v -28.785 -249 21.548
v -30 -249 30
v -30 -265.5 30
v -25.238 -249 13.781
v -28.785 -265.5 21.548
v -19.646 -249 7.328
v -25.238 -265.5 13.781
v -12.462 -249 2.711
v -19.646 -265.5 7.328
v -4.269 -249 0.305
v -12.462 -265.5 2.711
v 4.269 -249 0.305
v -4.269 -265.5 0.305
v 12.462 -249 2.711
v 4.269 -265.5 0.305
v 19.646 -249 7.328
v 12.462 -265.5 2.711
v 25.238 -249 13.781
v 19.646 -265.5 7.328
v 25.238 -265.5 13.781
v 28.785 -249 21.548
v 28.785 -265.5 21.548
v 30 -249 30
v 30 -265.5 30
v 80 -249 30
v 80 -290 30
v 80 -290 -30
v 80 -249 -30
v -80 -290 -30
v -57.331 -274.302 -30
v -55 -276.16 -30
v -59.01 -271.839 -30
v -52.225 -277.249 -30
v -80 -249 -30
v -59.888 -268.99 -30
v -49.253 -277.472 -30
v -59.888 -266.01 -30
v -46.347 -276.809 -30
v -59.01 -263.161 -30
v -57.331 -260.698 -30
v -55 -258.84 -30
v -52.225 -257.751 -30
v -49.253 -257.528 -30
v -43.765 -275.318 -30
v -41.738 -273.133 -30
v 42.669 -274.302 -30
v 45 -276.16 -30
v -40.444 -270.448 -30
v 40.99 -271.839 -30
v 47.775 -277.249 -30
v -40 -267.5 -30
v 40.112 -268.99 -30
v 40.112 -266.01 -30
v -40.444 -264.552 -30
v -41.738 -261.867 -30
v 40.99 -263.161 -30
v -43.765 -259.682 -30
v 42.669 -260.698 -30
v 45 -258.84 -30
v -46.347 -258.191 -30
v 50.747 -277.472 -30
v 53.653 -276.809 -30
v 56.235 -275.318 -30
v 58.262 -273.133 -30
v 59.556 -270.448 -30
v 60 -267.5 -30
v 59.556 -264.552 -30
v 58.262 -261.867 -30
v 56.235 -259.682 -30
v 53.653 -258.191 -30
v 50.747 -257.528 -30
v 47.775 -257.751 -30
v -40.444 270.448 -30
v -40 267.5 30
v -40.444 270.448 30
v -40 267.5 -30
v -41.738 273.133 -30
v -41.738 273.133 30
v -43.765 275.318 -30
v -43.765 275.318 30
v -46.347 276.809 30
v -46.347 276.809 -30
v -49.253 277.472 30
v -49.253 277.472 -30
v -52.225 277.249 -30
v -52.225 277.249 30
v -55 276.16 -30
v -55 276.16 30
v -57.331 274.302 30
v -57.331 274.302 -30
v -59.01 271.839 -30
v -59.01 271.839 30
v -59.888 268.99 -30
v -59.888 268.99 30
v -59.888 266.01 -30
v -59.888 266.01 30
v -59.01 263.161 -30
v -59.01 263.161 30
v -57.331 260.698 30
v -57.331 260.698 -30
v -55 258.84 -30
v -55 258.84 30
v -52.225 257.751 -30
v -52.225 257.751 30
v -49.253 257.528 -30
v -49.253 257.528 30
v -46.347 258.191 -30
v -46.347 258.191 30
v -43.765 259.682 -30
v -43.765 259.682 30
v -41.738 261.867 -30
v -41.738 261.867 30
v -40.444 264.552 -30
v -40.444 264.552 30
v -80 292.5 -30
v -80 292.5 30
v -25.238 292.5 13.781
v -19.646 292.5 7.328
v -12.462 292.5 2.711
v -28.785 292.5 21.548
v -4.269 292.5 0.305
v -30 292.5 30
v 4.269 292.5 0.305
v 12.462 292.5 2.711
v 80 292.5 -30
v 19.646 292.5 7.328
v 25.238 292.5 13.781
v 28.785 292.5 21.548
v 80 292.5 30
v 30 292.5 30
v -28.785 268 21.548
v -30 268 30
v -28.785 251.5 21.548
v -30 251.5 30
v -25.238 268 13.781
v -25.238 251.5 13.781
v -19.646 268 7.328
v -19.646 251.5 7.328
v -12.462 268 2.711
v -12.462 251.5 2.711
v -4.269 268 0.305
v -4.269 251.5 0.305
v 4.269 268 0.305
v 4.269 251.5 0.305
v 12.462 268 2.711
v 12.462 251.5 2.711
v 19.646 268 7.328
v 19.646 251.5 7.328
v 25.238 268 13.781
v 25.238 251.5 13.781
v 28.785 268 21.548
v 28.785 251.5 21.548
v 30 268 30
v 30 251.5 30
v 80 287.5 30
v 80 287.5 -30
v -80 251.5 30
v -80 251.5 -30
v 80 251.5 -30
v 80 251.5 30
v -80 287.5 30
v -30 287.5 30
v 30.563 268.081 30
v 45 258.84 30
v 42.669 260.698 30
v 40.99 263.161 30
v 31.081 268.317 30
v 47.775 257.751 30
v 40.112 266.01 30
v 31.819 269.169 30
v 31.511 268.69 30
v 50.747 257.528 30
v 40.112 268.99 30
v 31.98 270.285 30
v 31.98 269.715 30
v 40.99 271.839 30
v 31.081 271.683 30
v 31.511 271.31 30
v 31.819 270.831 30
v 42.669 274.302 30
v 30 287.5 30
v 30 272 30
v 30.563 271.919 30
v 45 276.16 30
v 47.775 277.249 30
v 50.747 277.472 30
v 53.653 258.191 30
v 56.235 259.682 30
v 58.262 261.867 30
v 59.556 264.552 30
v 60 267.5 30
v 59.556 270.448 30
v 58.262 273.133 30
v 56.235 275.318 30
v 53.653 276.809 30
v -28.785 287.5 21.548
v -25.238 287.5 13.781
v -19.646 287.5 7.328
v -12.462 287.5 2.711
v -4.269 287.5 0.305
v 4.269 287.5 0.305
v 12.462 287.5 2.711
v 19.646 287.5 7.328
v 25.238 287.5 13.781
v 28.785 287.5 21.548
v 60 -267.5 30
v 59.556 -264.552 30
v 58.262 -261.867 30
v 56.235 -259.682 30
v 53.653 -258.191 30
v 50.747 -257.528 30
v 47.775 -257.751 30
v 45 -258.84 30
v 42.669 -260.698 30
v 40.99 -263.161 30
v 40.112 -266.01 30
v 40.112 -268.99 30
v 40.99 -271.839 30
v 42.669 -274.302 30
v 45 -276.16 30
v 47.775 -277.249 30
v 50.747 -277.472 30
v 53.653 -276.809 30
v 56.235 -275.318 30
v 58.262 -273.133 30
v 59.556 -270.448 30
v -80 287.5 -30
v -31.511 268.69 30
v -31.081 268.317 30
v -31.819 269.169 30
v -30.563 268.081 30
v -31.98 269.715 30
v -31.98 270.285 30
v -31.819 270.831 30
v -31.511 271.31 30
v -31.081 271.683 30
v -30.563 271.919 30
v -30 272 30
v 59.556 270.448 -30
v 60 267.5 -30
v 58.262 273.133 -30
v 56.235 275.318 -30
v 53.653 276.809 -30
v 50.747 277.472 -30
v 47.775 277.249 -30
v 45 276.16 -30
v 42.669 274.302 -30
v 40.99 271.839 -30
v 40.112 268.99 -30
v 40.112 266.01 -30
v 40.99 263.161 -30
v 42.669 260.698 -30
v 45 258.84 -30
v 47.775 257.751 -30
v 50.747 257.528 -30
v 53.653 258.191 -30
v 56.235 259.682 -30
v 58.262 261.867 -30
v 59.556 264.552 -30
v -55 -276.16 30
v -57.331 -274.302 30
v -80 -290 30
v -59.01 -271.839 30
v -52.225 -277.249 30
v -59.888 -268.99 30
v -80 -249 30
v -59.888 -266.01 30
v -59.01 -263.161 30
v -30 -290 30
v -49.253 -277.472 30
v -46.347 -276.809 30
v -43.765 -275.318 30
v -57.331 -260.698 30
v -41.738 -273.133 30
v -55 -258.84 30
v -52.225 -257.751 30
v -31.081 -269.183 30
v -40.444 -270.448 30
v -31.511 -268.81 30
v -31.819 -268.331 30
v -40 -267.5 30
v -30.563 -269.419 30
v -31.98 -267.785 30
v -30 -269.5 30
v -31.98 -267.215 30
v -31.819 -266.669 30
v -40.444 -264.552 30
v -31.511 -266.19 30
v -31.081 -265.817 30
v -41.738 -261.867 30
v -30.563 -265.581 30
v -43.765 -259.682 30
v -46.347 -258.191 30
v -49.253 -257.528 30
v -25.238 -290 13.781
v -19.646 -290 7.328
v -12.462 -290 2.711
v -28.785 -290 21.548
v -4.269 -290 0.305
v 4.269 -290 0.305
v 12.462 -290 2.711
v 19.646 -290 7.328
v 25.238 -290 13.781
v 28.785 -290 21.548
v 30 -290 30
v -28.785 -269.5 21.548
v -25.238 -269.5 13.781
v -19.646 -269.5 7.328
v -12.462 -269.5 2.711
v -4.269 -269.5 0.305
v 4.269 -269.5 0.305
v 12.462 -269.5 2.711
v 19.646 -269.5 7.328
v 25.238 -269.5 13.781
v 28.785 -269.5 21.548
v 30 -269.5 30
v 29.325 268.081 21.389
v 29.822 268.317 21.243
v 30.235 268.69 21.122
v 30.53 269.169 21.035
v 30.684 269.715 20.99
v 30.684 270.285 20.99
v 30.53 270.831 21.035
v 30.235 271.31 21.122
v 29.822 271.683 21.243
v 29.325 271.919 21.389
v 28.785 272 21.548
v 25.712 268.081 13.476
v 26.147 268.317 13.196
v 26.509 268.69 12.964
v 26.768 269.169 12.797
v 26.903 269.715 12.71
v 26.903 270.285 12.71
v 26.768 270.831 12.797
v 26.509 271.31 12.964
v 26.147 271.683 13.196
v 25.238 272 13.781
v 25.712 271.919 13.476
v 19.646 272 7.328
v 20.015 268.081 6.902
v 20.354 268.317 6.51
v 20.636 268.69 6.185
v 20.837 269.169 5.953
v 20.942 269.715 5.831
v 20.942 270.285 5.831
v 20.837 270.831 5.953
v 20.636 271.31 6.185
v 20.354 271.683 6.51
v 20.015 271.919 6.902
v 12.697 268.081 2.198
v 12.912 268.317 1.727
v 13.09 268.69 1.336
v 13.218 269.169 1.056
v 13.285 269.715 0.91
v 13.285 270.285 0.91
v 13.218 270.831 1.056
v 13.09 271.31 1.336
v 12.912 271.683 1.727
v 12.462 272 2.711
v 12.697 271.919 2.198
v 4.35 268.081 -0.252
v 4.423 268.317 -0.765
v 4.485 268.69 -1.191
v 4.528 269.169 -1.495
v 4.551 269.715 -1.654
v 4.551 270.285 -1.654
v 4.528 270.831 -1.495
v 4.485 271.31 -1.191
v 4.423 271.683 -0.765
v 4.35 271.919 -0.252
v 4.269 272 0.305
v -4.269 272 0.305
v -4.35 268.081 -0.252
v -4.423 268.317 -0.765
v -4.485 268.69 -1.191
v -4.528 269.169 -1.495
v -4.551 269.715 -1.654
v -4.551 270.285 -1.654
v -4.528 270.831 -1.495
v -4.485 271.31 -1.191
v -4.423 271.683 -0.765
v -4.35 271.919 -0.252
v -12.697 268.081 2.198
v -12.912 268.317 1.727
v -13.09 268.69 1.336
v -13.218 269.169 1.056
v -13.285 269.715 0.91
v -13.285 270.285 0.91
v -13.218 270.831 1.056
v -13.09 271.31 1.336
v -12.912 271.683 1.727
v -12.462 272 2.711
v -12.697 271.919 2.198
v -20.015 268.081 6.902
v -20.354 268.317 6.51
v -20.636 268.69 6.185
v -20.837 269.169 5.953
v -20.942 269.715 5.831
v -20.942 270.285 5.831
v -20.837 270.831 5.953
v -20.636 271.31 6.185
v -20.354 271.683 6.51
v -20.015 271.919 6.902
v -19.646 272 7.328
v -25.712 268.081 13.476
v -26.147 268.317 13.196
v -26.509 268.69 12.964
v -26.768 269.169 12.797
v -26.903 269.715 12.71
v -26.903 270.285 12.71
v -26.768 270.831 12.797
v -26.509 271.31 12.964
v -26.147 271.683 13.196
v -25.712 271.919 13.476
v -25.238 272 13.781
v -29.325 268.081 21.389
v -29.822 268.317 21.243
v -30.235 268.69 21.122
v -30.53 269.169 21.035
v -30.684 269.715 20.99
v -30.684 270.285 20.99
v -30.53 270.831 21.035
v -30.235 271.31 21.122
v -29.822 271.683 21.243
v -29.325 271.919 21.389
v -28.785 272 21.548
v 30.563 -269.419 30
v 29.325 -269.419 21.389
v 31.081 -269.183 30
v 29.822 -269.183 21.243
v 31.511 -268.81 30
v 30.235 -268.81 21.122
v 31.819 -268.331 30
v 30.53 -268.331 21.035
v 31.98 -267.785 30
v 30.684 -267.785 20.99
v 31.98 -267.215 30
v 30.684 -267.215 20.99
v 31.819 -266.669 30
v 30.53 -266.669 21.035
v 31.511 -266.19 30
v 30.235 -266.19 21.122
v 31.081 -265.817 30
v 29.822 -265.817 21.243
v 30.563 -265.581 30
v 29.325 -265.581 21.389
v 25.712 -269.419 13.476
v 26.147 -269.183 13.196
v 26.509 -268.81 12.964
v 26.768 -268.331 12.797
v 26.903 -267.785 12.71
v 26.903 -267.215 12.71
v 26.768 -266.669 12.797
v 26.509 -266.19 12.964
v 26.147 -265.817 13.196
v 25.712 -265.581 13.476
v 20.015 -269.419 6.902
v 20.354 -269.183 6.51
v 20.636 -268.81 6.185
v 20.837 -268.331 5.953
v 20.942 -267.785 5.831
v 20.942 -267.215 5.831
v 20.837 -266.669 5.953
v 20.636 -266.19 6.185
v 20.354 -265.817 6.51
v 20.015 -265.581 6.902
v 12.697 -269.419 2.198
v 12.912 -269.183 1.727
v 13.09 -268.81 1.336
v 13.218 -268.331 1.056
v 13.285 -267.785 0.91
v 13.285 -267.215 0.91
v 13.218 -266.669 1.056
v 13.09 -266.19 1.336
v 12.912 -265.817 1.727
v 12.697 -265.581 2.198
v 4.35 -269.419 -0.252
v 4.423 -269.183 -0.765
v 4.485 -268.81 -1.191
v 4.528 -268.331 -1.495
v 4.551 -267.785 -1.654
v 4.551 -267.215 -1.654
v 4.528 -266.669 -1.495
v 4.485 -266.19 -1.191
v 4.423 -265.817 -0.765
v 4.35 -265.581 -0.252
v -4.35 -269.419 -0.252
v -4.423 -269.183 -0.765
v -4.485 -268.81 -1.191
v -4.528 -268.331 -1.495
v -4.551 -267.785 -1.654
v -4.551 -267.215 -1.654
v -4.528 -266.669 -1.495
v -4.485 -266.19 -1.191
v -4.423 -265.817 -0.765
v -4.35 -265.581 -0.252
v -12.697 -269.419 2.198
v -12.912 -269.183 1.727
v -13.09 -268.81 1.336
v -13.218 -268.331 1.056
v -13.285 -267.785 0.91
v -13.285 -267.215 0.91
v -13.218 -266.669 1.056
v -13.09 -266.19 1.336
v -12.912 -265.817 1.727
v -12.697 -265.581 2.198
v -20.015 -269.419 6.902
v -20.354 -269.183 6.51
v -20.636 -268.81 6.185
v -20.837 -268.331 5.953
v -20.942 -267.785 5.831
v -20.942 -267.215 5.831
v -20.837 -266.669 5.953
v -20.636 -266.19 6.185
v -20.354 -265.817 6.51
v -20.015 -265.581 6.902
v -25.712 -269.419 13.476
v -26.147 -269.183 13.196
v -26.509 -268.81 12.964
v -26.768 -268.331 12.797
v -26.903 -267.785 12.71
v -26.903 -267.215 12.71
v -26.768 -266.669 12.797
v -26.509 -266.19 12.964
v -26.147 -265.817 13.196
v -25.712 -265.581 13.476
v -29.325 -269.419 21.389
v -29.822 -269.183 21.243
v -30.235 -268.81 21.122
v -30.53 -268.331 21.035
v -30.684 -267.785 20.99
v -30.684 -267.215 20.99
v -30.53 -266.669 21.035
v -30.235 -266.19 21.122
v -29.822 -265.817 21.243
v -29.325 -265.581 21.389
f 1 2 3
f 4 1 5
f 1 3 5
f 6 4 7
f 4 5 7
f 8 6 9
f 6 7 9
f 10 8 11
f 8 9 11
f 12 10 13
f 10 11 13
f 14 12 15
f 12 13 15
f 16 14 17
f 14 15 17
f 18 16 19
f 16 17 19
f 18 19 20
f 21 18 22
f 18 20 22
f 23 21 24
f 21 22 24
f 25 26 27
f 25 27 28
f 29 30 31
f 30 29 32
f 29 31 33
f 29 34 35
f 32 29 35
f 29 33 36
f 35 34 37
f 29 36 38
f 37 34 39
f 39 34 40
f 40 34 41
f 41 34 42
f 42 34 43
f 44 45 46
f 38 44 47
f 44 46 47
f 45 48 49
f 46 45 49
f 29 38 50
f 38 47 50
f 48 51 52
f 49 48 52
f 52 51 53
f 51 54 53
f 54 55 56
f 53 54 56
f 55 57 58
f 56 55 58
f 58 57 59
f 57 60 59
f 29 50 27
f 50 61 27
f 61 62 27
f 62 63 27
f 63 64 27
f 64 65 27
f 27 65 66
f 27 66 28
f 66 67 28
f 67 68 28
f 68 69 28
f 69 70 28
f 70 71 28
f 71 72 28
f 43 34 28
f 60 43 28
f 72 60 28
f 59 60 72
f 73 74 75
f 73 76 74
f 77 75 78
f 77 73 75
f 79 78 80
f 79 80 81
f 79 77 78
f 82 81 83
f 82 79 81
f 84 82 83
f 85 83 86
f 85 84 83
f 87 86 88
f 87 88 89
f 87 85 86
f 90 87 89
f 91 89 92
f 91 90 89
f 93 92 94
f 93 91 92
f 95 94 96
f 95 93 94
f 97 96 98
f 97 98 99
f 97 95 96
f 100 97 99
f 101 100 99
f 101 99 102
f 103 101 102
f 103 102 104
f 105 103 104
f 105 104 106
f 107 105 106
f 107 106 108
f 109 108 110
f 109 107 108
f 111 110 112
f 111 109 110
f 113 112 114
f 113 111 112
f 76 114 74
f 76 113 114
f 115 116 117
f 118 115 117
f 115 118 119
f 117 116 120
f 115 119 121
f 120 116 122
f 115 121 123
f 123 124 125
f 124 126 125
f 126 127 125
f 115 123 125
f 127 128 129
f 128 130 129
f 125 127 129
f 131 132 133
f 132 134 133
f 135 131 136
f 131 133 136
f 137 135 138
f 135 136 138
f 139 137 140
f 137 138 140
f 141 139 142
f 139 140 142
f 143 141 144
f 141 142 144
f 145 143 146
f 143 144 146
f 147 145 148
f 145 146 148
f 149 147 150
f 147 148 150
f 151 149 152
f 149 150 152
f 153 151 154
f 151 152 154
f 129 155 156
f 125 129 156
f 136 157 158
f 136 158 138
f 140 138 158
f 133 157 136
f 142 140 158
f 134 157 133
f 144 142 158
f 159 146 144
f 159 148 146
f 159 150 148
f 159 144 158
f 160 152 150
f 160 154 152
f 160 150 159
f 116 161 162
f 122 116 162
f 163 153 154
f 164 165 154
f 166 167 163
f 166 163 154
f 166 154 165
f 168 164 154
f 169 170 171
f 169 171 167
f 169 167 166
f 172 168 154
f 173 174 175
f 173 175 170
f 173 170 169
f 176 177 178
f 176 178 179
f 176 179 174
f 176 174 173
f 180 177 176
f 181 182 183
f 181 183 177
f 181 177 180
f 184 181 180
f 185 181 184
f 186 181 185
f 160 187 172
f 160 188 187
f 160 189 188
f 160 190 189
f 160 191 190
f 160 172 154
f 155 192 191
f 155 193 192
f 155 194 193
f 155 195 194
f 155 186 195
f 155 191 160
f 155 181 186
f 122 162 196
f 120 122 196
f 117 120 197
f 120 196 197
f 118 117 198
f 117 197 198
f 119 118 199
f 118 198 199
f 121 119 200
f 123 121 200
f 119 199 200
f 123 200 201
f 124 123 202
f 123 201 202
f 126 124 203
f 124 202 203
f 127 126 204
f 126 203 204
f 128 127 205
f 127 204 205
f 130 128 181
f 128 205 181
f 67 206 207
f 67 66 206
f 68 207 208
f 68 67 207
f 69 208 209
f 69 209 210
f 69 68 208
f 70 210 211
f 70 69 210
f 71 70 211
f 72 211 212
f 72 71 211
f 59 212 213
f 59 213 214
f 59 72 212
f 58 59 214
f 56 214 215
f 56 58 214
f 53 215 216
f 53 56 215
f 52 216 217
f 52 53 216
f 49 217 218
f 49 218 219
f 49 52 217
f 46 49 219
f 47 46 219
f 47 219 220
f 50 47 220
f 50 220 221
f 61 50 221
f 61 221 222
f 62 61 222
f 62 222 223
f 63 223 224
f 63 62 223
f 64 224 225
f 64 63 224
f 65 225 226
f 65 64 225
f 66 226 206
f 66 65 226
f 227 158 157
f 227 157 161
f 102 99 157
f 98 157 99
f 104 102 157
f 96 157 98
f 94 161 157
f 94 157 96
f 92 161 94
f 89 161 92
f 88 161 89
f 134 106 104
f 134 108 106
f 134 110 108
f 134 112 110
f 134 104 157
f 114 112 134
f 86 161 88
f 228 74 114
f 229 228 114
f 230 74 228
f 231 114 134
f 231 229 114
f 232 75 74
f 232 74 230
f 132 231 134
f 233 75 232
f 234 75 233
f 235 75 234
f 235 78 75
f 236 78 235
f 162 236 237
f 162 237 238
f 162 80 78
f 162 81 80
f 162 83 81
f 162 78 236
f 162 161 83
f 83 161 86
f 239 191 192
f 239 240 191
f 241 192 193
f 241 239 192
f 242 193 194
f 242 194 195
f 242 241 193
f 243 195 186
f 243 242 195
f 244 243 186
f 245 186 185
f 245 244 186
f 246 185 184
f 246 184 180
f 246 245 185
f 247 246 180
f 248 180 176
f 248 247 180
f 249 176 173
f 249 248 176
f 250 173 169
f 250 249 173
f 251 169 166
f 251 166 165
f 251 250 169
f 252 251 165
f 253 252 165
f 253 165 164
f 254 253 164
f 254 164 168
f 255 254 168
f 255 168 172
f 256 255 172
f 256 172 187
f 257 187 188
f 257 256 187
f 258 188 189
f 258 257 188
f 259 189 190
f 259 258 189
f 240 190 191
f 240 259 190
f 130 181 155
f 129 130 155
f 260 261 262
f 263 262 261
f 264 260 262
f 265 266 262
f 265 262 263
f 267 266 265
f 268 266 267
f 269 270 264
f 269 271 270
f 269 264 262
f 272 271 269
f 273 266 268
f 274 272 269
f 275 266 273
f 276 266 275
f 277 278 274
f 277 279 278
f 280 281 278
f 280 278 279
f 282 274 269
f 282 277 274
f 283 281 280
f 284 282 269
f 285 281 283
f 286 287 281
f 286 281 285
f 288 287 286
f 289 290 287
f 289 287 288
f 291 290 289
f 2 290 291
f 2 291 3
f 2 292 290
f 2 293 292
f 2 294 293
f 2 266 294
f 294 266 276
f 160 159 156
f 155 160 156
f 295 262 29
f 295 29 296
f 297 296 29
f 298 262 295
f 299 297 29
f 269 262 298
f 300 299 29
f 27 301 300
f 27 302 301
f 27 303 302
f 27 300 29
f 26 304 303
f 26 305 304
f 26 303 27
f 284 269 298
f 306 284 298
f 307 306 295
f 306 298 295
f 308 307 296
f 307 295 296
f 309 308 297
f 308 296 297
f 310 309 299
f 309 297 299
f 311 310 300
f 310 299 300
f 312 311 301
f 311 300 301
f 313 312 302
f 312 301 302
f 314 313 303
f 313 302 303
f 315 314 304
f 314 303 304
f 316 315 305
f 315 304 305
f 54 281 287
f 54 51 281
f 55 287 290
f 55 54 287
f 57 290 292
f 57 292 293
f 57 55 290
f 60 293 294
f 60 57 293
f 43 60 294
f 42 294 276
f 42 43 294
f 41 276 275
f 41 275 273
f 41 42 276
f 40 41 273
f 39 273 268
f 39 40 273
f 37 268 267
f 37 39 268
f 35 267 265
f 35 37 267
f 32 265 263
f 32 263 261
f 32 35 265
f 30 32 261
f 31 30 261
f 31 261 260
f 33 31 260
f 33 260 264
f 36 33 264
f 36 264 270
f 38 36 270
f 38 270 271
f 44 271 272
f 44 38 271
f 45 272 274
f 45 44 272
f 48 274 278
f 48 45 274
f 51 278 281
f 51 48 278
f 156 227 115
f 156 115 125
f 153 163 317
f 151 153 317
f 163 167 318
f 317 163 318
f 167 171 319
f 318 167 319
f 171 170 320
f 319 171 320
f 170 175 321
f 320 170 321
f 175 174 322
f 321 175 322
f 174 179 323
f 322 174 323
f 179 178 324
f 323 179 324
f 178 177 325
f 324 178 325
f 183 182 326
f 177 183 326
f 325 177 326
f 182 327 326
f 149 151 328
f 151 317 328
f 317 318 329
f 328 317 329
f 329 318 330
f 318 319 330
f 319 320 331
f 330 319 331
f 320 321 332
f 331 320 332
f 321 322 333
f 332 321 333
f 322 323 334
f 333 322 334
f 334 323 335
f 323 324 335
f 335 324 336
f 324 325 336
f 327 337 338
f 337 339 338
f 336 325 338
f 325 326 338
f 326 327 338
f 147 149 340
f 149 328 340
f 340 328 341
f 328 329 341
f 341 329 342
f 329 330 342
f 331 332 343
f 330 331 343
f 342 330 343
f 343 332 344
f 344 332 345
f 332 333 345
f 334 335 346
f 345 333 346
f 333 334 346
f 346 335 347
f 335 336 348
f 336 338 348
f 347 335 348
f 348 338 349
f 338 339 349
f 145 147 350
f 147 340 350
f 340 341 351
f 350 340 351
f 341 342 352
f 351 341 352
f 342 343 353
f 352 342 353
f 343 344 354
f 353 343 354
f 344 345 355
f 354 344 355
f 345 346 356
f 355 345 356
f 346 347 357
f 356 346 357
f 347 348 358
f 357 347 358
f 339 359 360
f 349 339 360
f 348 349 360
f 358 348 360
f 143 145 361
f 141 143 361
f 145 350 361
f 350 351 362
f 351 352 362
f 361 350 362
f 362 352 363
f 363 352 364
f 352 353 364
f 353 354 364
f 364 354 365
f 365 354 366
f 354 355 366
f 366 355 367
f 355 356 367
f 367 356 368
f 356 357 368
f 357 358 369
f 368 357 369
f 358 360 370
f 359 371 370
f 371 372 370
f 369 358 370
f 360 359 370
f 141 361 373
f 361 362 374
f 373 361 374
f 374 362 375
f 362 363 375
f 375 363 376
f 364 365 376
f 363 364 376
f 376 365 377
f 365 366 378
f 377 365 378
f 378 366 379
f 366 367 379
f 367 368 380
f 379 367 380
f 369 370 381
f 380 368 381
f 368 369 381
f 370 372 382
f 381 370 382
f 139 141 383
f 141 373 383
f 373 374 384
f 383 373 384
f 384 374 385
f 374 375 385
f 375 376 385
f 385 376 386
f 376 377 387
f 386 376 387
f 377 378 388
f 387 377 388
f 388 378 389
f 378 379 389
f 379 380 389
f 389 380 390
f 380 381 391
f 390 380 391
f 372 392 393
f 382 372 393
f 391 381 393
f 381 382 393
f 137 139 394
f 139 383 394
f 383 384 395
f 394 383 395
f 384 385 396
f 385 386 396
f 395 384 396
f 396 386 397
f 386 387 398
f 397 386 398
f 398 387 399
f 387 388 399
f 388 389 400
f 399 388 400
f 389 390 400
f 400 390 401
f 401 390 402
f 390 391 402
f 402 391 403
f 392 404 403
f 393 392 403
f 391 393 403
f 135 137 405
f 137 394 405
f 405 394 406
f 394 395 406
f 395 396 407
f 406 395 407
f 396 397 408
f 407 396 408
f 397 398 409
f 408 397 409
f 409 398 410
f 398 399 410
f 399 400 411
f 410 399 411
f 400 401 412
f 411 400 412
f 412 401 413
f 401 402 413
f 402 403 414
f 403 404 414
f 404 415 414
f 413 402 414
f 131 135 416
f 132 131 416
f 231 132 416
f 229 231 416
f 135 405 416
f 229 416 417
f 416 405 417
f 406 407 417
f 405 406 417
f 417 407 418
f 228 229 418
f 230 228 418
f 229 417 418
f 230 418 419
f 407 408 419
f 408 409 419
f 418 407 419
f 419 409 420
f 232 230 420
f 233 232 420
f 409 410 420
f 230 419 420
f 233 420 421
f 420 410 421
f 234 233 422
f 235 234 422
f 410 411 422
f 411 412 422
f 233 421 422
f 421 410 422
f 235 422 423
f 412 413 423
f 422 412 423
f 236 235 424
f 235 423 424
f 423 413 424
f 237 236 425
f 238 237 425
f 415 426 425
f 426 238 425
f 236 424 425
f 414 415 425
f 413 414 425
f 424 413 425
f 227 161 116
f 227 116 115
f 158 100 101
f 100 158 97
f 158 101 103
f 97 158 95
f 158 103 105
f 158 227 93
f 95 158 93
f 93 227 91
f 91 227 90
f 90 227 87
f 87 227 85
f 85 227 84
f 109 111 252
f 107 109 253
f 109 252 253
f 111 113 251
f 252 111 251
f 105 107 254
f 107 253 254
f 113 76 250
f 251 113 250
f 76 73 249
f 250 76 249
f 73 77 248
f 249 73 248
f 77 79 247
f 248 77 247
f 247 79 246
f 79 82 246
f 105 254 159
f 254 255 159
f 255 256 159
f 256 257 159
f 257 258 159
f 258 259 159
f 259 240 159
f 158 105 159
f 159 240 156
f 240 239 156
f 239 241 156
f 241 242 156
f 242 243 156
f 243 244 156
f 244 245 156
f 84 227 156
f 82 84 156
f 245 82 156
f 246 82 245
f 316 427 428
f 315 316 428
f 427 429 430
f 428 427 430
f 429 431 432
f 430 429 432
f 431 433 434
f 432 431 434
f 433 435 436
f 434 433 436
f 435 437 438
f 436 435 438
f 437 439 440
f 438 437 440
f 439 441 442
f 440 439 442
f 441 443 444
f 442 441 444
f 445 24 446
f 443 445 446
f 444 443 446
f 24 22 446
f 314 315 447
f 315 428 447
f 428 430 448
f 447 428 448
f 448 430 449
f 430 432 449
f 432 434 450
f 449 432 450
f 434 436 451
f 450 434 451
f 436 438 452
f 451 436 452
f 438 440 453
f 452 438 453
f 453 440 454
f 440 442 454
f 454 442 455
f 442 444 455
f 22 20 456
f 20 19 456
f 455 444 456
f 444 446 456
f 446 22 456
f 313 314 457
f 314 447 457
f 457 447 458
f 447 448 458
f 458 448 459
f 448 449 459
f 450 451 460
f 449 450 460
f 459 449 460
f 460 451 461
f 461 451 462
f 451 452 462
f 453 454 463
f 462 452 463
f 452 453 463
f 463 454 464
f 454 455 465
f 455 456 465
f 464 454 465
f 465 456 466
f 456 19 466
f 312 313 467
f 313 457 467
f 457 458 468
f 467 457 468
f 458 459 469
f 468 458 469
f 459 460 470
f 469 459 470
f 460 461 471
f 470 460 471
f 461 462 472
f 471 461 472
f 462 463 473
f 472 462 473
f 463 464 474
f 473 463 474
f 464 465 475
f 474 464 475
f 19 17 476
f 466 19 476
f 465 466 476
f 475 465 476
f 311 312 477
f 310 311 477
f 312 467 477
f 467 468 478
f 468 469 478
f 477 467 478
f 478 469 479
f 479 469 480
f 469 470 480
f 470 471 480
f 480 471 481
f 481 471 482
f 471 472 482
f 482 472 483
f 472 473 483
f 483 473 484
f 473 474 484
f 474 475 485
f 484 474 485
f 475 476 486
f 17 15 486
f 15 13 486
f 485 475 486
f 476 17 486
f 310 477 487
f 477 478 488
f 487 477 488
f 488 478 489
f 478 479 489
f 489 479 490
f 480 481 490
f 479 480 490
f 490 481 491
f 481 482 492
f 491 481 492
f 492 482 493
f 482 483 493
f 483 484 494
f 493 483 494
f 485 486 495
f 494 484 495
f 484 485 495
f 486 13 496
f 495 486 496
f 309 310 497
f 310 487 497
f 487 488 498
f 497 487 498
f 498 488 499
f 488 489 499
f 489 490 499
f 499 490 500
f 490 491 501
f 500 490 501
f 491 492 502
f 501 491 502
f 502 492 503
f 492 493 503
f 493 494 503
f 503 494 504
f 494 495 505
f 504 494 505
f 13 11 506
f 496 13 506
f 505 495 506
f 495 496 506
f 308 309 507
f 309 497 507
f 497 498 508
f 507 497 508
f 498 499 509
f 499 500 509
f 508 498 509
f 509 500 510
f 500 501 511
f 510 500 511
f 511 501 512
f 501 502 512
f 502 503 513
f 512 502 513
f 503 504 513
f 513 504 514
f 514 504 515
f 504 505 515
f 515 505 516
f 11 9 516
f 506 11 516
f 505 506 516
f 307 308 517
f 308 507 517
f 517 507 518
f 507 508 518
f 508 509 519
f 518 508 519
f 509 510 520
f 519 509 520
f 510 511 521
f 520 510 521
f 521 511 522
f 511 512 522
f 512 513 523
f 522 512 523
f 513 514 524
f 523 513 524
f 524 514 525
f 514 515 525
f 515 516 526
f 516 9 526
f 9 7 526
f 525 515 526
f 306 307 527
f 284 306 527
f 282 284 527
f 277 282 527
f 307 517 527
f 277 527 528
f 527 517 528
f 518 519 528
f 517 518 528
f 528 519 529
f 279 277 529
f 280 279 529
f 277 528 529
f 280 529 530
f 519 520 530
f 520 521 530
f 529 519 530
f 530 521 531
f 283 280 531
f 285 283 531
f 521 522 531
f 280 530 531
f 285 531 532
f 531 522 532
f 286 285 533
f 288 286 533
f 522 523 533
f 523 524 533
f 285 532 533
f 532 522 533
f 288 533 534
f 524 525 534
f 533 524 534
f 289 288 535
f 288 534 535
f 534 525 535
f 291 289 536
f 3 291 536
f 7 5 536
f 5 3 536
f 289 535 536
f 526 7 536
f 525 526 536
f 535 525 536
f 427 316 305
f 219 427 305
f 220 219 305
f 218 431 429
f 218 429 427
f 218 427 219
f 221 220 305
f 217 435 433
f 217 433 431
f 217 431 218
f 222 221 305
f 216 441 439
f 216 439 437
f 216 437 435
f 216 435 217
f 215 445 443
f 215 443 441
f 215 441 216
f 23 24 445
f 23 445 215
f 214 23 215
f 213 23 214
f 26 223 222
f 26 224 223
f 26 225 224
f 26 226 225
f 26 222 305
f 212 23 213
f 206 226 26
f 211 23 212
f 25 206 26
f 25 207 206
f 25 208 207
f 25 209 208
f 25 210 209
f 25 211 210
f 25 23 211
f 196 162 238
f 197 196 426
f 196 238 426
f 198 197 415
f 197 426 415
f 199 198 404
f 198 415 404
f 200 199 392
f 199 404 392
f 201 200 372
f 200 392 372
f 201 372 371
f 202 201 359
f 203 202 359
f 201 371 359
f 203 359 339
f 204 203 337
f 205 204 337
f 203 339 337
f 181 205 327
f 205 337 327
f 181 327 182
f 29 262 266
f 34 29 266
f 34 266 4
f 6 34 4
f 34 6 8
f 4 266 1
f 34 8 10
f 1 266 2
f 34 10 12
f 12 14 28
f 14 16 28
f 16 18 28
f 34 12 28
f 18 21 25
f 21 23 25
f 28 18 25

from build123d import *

# Parameters (mm, degrees)
F0_W     = 160
F0_H     = 40
F0_R     = 10
F1_DEPTH = 30
F0_H_2   = 45
F3_DEPTH = 577.501
F4_R     = 2
F6_DEPTH = 5
F7_DEPTH = 4
F8_DEPTH = 4


with BuildPart() as f1:
    # F0 (on Top) → F1 (new body, symmetric)
    with BuildSketch(Plane.XY):
        with Locations((0, 267.5)):
            Rectangle(F0_W, F0_H)
        with Locations((-50, 267.5)):
            Circle(F0_R, mode=Mode.SUBTRACT)
        with Locations((50, 267.5)):
            Circle(F0_R, mode=Mode.SUBTRACT)
    extrude(amount=F1_DEPTH, both=True)


with BuildPart() as f1b:
    # F0 (on Top) → F1, piece 2 (new body, symmetric)
    with BuildSketch(Plane.XY):
        with Locations((0, -267.5)):
            Rectangle(F0_W, F0_H_2)
        with Locations((-50, -267.5)):
            Circle(F0_R, mode=Mode.SUBTRACT)
        with Locations((50, -267.5)):
            Circle(F0_R, mode=Mode.SUBTRACT)
    extrude(amount=F1_DEPTH, both=True)


with BuildPart() as f3_tool:
    # F2 (on face) → F3 (new body, through all)
    with BuildSketch(Plane.XZ.offset(290)):
        with BuildLine():
            ThreePointArc((-30, 30), (0, 0), (30, 30))
            Line((30, 30), (-30, 30))
        make_face()
        with BuildLine():
            Line((-30, 30), (30, 30))
            ThreePointArc((30, 30), (0, 60), (-30, 30))
        make_face()
    extrude(amount=-F3_DEPTH)


with BuildPart() as f1_1:
    add(f1.part)

    # F3: cut by f3_tool
    add(f3_tool.part, mode=Mode.SUBTRACT)


with BuildPart() as f1b_1:
    add(f1b.part)

    # F3: cut by f3_tool
    add(f3_tool.part, mode=Mode.SUBTRACT)


with BuildPart() as f5_tool:
    # F4 (on face) → F5 (revolve)
    with BuildSketch(Plane.XY.offset(30)):
        with Locations((30, 270)):
            Circle(F4_R)
        with Locations((30, -267.5)):
            Circle(F4_R)
    revolve(axis=Axis((0, -0.4611611366, 30), (0, 1, 0)))


with BuildPart() as f1_2:
    add(f1_1.part)

    # F5: cut by f5_tool
    add(f5_tool.part, mode=Mode.SUBTRACT)

    # F6 (add): a face of the model
    f6_faces = [f1_2.faces().sort_by_distance(p)[0] for p in [
        (0, 287.5, -2.9820004893),
    ]]
    extrude(f6_faces, amount=F6_DEPTH)

    # F8 (cut): a face of the model
    f8_faces = [f1_2.faces().sort_by_distance(p)[0] for p in [
        (0, 247.5, -2.9820004893),
    ]]
    extrude(f8_faces, amount=-F8_DEPTH, mode=Mode.SUBTRACT)


with BuildPart() as f1b_2:
    add(f1b_1.part)

    # F5: cut by f5_tool
    add(f5_tool.part, mode=Mode.SUBTRACT)

    # F7 (cut): a face of the model
    f7_faces = [f1b_2.faces().sort_by_distance(p)[0] for p in [
        (0, -245, -2.9820004893),
    ]]
    extrude(f7_faces, amount=-F7_DEPTH, mode=Mode.SUBTRACT)


solid = Compound([f1_2.part, f1b_2.part])
